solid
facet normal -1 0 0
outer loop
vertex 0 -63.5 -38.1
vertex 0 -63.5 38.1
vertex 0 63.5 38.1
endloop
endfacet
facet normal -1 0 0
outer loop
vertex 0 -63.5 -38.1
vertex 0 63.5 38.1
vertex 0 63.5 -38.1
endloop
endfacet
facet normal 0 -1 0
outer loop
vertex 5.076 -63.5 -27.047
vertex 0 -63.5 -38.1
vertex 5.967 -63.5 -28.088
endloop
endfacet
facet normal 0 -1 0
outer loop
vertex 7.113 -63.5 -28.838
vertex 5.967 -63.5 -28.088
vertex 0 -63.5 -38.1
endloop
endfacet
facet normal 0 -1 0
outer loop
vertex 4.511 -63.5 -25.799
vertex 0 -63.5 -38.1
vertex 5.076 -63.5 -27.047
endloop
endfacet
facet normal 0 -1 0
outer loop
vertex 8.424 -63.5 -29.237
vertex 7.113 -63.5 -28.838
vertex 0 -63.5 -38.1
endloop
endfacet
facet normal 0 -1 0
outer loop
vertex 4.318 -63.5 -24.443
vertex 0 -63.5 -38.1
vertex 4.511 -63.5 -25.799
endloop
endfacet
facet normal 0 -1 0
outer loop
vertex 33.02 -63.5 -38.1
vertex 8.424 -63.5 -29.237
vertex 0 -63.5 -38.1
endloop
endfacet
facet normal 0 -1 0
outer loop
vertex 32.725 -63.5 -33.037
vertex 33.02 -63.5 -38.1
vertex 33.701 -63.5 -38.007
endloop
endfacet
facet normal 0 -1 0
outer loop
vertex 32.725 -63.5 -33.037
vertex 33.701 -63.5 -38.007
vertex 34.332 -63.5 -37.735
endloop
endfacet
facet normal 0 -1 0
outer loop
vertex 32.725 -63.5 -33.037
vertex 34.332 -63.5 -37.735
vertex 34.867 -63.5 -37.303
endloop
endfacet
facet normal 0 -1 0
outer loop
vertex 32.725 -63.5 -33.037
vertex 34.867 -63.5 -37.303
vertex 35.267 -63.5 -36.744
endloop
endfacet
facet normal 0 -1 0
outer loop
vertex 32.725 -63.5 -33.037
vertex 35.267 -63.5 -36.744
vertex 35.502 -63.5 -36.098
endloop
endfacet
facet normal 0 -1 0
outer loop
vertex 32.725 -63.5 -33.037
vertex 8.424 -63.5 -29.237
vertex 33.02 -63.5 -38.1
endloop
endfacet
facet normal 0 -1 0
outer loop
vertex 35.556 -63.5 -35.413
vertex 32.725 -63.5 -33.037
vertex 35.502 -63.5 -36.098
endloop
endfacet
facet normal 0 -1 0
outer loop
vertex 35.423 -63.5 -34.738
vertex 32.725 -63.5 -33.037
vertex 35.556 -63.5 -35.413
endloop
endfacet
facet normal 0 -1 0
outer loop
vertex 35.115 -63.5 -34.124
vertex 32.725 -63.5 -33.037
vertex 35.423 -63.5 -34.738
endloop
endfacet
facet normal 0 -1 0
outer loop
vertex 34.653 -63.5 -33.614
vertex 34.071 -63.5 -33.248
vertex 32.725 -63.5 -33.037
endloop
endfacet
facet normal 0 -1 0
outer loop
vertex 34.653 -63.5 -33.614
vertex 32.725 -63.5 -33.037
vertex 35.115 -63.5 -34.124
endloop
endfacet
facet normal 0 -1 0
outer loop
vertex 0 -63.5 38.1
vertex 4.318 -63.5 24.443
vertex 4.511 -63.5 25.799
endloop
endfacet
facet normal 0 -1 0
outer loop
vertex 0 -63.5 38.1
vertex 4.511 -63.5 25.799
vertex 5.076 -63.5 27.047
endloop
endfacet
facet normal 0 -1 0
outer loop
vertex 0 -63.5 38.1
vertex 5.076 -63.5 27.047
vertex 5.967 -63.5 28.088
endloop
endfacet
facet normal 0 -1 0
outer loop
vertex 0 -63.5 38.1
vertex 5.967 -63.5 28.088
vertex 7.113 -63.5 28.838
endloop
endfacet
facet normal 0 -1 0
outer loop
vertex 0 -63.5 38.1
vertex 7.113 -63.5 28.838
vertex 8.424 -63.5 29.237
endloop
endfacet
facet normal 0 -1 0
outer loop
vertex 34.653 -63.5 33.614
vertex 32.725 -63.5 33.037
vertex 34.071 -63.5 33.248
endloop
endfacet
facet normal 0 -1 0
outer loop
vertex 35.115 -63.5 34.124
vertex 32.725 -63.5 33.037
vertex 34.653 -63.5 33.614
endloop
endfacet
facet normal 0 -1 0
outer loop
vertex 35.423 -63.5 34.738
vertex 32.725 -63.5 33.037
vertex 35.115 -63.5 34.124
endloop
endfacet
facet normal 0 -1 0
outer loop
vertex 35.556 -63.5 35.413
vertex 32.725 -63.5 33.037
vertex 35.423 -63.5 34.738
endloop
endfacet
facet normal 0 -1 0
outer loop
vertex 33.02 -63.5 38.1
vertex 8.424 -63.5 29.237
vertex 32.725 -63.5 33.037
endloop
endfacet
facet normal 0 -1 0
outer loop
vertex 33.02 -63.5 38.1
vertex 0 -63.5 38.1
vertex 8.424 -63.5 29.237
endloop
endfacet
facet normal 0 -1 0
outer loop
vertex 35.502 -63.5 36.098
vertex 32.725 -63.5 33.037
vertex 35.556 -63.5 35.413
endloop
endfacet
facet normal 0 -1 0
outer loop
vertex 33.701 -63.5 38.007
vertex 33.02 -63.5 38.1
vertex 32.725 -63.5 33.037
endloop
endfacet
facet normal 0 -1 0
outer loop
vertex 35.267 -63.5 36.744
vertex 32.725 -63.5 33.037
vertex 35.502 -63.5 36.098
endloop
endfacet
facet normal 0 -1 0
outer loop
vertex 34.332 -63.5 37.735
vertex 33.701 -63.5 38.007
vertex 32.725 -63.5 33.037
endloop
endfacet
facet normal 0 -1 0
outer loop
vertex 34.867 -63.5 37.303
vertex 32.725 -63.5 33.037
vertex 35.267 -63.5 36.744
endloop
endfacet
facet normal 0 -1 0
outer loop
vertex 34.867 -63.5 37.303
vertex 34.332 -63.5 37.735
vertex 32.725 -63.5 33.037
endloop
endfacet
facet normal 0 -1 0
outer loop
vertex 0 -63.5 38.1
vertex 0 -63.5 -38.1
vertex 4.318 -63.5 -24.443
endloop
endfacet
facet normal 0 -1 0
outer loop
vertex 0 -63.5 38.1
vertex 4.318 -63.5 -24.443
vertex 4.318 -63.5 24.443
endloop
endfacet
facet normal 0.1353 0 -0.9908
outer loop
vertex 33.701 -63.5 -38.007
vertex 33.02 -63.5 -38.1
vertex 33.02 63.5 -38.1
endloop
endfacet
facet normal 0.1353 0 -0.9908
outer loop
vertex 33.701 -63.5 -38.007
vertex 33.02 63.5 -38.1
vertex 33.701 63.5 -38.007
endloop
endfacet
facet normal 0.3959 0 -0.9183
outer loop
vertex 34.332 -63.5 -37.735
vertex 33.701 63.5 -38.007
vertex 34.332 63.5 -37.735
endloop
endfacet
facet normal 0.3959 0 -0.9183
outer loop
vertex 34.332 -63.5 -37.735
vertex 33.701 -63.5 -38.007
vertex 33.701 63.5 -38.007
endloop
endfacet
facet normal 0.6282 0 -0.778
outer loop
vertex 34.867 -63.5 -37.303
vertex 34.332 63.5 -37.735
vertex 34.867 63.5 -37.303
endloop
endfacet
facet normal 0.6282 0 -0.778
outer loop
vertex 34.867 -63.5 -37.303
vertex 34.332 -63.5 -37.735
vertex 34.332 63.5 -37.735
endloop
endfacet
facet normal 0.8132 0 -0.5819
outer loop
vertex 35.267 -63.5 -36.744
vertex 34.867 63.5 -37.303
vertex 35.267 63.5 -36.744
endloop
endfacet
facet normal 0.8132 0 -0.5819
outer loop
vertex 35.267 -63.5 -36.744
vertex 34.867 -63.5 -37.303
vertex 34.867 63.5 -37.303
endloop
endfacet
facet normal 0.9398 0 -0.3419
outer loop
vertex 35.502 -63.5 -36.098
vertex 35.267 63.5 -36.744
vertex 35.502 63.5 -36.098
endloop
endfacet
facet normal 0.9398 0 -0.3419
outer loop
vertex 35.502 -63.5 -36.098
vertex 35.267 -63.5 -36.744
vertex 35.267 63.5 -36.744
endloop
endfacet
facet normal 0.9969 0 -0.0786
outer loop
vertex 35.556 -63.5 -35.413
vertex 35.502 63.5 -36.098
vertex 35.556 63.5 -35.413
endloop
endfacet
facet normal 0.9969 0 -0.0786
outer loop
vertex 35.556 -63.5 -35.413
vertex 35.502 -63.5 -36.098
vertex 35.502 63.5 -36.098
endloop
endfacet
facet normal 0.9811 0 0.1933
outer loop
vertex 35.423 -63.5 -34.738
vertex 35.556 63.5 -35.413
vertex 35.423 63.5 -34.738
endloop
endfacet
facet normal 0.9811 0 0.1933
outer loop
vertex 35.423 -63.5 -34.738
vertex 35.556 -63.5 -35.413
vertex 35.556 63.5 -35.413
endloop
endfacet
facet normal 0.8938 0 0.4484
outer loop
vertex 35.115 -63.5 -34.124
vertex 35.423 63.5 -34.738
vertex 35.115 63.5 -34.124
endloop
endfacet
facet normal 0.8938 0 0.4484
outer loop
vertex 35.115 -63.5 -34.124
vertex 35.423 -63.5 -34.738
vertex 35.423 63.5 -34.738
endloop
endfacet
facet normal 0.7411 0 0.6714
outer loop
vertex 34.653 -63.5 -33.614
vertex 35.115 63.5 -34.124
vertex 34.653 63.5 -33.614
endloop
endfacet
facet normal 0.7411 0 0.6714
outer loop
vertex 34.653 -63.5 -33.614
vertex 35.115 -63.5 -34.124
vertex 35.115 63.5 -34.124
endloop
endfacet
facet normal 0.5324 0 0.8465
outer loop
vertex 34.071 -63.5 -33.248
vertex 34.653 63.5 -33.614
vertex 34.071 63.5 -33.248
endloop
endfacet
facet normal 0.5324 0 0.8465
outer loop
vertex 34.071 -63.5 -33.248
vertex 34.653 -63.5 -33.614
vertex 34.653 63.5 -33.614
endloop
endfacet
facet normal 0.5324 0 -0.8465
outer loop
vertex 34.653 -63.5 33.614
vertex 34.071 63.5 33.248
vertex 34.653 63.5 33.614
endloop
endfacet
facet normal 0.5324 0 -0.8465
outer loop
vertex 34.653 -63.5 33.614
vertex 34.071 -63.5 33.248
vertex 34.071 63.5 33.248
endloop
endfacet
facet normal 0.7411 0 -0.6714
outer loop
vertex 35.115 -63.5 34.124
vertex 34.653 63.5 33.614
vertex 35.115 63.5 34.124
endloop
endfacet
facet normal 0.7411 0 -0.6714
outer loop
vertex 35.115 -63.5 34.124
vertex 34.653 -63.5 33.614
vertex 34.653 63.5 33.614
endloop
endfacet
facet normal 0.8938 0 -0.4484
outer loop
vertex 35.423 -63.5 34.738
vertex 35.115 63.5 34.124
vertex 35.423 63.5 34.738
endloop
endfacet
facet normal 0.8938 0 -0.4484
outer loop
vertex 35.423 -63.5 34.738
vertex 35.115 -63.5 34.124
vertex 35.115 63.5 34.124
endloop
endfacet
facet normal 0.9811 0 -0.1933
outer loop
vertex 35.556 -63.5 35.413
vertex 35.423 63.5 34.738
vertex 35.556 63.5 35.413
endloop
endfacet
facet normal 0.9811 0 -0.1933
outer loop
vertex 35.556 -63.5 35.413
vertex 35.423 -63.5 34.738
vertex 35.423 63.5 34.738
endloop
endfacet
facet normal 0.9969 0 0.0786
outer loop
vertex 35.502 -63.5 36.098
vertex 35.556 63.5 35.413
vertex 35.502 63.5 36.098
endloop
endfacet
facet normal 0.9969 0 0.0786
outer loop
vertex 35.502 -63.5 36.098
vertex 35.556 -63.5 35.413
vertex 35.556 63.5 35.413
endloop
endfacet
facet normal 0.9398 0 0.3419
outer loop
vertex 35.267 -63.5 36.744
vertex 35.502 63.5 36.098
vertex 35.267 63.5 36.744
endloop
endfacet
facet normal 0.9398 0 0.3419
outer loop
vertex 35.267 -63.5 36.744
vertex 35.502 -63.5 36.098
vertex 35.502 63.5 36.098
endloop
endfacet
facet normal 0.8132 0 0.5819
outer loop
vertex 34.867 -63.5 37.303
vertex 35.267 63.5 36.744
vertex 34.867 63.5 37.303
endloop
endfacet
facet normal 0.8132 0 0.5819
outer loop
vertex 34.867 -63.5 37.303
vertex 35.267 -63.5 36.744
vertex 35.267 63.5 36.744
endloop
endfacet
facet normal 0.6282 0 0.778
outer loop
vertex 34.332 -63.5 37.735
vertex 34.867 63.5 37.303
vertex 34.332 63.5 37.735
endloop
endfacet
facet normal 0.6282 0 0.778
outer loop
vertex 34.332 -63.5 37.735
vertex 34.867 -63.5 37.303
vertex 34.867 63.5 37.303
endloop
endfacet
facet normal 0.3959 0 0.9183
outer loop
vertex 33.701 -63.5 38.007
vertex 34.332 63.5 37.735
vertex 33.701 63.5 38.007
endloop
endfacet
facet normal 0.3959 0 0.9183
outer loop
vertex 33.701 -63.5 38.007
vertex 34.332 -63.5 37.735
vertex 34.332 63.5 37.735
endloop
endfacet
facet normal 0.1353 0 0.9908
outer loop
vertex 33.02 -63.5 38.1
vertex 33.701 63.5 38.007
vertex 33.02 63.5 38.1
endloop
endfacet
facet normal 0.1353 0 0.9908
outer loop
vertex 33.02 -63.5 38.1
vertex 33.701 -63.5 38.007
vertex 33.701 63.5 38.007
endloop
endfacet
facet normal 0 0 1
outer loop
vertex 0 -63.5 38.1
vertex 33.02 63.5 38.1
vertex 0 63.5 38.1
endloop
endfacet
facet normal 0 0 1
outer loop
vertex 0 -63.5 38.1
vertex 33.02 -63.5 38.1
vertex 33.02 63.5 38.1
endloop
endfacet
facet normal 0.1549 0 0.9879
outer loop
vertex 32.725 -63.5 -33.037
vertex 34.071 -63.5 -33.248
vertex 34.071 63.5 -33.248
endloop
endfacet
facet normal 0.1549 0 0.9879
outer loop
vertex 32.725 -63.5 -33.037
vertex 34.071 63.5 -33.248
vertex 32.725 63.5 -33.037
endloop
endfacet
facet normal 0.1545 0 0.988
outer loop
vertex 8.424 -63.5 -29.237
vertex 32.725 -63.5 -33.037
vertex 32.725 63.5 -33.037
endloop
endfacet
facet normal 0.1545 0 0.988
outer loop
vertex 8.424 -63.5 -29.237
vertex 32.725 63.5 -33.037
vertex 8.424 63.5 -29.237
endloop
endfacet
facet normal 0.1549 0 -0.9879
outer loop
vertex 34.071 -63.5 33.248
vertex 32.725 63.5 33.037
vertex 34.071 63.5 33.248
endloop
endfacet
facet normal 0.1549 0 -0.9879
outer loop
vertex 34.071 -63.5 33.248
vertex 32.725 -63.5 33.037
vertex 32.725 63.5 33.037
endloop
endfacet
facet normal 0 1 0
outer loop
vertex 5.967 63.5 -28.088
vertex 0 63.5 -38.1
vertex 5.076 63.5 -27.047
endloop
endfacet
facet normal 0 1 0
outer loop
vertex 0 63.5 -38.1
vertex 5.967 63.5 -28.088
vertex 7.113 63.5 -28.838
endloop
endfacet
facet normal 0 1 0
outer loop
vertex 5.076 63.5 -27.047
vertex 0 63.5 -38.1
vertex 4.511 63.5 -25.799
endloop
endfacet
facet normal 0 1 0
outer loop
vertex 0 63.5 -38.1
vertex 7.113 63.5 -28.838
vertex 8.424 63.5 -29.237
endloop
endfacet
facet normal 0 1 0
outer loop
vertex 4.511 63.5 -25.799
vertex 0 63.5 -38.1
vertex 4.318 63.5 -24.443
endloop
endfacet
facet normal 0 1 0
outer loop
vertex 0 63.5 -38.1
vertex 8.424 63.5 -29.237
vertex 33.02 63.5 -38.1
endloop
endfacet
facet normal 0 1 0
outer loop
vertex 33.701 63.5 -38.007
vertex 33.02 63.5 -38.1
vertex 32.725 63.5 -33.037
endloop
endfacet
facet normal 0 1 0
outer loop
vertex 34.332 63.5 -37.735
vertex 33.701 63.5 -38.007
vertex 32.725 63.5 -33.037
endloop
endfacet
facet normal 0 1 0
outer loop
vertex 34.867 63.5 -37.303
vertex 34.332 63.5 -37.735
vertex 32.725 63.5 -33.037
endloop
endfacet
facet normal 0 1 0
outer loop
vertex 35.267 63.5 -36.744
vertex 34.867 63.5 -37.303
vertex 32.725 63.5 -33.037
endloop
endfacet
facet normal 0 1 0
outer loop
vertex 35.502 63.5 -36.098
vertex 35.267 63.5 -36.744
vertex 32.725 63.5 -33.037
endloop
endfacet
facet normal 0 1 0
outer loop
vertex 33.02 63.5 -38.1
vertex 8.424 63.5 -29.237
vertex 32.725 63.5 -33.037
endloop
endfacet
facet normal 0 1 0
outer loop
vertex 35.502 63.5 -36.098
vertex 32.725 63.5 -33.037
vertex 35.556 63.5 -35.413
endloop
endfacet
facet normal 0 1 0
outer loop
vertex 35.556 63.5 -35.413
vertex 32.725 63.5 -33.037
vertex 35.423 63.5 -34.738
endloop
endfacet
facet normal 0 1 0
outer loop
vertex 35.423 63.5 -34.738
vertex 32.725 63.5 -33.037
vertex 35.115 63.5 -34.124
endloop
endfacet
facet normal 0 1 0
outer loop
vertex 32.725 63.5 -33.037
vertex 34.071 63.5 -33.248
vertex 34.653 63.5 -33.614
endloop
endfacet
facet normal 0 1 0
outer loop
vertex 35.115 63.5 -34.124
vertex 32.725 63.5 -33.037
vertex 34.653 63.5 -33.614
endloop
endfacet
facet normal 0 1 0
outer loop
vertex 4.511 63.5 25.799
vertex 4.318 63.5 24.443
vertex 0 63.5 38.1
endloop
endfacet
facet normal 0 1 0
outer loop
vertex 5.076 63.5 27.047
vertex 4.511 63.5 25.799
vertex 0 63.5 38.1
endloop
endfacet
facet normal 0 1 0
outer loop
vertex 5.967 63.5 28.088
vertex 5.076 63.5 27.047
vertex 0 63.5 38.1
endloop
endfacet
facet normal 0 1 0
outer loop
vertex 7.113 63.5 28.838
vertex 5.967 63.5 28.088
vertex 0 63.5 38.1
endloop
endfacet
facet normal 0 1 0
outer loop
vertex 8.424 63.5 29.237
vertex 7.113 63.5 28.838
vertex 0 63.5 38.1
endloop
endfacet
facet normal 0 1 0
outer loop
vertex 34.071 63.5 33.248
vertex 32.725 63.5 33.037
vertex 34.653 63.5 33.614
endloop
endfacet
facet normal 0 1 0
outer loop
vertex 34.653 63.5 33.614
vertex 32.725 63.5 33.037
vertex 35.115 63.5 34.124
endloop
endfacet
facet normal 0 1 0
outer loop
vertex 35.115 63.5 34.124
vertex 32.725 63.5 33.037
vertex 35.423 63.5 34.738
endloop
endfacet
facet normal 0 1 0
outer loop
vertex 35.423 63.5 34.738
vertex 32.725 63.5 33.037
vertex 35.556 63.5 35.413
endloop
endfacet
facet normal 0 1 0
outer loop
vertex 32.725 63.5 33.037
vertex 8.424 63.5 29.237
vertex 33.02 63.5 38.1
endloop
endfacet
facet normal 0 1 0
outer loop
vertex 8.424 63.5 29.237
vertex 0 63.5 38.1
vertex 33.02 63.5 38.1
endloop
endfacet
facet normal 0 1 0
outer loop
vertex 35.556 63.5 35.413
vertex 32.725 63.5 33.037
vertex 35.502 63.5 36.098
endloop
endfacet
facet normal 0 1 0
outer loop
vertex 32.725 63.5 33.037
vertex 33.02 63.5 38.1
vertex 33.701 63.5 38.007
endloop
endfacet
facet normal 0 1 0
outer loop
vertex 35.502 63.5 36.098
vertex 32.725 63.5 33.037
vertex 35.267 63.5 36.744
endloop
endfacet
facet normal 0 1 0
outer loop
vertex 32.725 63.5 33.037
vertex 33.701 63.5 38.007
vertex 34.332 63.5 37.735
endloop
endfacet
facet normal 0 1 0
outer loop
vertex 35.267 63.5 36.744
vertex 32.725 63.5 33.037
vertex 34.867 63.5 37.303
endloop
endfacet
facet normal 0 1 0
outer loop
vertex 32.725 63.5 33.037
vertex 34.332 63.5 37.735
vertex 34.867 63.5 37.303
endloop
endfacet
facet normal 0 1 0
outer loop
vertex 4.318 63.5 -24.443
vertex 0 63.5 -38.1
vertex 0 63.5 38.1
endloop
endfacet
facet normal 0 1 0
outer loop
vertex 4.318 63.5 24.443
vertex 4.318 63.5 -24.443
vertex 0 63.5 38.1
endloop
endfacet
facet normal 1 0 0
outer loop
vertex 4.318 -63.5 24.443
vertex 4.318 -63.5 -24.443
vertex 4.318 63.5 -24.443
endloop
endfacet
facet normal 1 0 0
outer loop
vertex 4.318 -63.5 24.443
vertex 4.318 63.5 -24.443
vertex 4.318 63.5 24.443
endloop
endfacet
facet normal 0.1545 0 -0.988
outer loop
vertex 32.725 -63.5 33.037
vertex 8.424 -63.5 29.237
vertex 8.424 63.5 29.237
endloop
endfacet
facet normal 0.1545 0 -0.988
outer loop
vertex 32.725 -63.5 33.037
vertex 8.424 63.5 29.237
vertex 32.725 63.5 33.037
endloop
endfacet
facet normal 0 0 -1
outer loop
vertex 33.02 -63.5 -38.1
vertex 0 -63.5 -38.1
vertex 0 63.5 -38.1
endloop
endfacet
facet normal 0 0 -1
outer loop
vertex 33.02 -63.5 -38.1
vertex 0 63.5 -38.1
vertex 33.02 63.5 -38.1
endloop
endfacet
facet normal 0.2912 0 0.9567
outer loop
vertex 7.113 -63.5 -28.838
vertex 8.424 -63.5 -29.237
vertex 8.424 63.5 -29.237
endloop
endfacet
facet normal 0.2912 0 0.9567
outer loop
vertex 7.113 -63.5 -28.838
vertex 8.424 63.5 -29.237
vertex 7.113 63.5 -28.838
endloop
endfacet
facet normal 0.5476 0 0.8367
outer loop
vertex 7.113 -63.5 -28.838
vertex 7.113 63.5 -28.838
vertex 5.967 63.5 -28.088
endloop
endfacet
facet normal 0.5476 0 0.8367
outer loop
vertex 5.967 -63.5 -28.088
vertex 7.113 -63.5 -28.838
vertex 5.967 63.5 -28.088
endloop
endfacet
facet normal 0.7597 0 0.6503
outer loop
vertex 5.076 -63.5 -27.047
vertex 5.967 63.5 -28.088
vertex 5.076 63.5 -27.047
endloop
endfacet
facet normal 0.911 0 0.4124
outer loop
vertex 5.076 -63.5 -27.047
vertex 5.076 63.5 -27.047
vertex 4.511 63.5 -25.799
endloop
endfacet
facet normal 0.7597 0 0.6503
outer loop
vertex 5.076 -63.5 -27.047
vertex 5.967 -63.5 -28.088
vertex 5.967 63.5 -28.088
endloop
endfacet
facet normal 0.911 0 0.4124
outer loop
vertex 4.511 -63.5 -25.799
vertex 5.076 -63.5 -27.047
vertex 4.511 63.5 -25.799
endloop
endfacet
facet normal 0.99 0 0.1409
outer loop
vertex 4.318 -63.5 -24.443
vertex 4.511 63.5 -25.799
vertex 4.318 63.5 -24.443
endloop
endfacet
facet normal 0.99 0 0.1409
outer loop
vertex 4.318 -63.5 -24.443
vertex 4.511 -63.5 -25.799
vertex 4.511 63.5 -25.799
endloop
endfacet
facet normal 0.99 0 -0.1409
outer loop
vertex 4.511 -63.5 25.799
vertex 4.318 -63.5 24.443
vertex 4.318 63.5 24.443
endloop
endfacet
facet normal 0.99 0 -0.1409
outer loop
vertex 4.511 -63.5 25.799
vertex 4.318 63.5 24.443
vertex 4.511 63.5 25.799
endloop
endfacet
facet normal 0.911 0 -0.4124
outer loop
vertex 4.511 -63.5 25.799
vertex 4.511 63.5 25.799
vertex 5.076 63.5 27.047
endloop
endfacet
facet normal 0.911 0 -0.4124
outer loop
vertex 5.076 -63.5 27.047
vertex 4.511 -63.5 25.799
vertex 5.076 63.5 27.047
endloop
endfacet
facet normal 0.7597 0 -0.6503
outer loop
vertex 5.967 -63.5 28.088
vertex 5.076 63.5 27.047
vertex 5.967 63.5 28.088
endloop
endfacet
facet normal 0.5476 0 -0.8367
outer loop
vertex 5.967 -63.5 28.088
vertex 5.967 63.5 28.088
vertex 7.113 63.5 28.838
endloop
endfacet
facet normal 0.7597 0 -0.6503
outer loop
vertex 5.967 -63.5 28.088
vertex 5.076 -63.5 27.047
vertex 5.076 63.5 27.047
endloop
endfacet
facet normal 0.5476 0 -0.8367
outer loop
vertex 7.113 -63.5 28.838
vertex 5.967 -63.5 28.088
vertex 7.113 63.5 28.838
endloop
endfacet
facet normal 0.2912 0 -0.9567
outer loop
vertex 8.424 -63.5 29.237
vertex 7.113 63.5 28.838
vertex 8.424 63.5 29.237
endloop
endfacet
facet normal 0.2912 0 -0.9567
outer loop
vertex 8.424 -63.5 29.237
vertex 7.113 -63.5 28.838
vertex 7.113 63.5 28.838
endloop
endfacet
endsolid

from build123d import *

# Parameters (mm, degrees)
F1_DEPTH = 63.5


with BuildPart() as f1:
    # F0 (on Front) → F1 (new body, symmetric)
    with BuildSketch(Plane.XZ):
        with BuildLine():
            Line((33.02, 38.1), (0, 38.1))
            Line((0, 38.1), (0, 0))
            Line((0, 0), (0, -38.1))
            Line((0, -38.1), (33.02, -38.1))
            ThreePointArc((33.02, -38.1), (35.502395, -36.097882), (34.071366, -33.247808))
            Line((34.071366, -33.247808), (32.724711, -33.037223))
            Line((32.724711, -33.037223), (8.423599, -29.237091))
            ThreePointArc((8.423599, -29.237091), (5.484684, -27.59914), (4.318, -24.44336))
            Line((4.318, -24.44336), (4.318, 0))
            Line((4.318, 0), (4.318, 24.44336))
            ThreePointArc((4.318, 24.44336), (5.484684, 27.59914), (8.423599, 29.237091))
            Line((8.423599, 29.237091), (32.724711, 33.037223))
            Line((32.724711, 33.037223), (34.071366, 33.247808))
            ThreePointArc((34.071366, 33.247808), (35.502395, 36.097882), (33.02, 38.1))
        make_face()
    extrude(amount=F1_DEPTH, both=True)


solid = f1.part
